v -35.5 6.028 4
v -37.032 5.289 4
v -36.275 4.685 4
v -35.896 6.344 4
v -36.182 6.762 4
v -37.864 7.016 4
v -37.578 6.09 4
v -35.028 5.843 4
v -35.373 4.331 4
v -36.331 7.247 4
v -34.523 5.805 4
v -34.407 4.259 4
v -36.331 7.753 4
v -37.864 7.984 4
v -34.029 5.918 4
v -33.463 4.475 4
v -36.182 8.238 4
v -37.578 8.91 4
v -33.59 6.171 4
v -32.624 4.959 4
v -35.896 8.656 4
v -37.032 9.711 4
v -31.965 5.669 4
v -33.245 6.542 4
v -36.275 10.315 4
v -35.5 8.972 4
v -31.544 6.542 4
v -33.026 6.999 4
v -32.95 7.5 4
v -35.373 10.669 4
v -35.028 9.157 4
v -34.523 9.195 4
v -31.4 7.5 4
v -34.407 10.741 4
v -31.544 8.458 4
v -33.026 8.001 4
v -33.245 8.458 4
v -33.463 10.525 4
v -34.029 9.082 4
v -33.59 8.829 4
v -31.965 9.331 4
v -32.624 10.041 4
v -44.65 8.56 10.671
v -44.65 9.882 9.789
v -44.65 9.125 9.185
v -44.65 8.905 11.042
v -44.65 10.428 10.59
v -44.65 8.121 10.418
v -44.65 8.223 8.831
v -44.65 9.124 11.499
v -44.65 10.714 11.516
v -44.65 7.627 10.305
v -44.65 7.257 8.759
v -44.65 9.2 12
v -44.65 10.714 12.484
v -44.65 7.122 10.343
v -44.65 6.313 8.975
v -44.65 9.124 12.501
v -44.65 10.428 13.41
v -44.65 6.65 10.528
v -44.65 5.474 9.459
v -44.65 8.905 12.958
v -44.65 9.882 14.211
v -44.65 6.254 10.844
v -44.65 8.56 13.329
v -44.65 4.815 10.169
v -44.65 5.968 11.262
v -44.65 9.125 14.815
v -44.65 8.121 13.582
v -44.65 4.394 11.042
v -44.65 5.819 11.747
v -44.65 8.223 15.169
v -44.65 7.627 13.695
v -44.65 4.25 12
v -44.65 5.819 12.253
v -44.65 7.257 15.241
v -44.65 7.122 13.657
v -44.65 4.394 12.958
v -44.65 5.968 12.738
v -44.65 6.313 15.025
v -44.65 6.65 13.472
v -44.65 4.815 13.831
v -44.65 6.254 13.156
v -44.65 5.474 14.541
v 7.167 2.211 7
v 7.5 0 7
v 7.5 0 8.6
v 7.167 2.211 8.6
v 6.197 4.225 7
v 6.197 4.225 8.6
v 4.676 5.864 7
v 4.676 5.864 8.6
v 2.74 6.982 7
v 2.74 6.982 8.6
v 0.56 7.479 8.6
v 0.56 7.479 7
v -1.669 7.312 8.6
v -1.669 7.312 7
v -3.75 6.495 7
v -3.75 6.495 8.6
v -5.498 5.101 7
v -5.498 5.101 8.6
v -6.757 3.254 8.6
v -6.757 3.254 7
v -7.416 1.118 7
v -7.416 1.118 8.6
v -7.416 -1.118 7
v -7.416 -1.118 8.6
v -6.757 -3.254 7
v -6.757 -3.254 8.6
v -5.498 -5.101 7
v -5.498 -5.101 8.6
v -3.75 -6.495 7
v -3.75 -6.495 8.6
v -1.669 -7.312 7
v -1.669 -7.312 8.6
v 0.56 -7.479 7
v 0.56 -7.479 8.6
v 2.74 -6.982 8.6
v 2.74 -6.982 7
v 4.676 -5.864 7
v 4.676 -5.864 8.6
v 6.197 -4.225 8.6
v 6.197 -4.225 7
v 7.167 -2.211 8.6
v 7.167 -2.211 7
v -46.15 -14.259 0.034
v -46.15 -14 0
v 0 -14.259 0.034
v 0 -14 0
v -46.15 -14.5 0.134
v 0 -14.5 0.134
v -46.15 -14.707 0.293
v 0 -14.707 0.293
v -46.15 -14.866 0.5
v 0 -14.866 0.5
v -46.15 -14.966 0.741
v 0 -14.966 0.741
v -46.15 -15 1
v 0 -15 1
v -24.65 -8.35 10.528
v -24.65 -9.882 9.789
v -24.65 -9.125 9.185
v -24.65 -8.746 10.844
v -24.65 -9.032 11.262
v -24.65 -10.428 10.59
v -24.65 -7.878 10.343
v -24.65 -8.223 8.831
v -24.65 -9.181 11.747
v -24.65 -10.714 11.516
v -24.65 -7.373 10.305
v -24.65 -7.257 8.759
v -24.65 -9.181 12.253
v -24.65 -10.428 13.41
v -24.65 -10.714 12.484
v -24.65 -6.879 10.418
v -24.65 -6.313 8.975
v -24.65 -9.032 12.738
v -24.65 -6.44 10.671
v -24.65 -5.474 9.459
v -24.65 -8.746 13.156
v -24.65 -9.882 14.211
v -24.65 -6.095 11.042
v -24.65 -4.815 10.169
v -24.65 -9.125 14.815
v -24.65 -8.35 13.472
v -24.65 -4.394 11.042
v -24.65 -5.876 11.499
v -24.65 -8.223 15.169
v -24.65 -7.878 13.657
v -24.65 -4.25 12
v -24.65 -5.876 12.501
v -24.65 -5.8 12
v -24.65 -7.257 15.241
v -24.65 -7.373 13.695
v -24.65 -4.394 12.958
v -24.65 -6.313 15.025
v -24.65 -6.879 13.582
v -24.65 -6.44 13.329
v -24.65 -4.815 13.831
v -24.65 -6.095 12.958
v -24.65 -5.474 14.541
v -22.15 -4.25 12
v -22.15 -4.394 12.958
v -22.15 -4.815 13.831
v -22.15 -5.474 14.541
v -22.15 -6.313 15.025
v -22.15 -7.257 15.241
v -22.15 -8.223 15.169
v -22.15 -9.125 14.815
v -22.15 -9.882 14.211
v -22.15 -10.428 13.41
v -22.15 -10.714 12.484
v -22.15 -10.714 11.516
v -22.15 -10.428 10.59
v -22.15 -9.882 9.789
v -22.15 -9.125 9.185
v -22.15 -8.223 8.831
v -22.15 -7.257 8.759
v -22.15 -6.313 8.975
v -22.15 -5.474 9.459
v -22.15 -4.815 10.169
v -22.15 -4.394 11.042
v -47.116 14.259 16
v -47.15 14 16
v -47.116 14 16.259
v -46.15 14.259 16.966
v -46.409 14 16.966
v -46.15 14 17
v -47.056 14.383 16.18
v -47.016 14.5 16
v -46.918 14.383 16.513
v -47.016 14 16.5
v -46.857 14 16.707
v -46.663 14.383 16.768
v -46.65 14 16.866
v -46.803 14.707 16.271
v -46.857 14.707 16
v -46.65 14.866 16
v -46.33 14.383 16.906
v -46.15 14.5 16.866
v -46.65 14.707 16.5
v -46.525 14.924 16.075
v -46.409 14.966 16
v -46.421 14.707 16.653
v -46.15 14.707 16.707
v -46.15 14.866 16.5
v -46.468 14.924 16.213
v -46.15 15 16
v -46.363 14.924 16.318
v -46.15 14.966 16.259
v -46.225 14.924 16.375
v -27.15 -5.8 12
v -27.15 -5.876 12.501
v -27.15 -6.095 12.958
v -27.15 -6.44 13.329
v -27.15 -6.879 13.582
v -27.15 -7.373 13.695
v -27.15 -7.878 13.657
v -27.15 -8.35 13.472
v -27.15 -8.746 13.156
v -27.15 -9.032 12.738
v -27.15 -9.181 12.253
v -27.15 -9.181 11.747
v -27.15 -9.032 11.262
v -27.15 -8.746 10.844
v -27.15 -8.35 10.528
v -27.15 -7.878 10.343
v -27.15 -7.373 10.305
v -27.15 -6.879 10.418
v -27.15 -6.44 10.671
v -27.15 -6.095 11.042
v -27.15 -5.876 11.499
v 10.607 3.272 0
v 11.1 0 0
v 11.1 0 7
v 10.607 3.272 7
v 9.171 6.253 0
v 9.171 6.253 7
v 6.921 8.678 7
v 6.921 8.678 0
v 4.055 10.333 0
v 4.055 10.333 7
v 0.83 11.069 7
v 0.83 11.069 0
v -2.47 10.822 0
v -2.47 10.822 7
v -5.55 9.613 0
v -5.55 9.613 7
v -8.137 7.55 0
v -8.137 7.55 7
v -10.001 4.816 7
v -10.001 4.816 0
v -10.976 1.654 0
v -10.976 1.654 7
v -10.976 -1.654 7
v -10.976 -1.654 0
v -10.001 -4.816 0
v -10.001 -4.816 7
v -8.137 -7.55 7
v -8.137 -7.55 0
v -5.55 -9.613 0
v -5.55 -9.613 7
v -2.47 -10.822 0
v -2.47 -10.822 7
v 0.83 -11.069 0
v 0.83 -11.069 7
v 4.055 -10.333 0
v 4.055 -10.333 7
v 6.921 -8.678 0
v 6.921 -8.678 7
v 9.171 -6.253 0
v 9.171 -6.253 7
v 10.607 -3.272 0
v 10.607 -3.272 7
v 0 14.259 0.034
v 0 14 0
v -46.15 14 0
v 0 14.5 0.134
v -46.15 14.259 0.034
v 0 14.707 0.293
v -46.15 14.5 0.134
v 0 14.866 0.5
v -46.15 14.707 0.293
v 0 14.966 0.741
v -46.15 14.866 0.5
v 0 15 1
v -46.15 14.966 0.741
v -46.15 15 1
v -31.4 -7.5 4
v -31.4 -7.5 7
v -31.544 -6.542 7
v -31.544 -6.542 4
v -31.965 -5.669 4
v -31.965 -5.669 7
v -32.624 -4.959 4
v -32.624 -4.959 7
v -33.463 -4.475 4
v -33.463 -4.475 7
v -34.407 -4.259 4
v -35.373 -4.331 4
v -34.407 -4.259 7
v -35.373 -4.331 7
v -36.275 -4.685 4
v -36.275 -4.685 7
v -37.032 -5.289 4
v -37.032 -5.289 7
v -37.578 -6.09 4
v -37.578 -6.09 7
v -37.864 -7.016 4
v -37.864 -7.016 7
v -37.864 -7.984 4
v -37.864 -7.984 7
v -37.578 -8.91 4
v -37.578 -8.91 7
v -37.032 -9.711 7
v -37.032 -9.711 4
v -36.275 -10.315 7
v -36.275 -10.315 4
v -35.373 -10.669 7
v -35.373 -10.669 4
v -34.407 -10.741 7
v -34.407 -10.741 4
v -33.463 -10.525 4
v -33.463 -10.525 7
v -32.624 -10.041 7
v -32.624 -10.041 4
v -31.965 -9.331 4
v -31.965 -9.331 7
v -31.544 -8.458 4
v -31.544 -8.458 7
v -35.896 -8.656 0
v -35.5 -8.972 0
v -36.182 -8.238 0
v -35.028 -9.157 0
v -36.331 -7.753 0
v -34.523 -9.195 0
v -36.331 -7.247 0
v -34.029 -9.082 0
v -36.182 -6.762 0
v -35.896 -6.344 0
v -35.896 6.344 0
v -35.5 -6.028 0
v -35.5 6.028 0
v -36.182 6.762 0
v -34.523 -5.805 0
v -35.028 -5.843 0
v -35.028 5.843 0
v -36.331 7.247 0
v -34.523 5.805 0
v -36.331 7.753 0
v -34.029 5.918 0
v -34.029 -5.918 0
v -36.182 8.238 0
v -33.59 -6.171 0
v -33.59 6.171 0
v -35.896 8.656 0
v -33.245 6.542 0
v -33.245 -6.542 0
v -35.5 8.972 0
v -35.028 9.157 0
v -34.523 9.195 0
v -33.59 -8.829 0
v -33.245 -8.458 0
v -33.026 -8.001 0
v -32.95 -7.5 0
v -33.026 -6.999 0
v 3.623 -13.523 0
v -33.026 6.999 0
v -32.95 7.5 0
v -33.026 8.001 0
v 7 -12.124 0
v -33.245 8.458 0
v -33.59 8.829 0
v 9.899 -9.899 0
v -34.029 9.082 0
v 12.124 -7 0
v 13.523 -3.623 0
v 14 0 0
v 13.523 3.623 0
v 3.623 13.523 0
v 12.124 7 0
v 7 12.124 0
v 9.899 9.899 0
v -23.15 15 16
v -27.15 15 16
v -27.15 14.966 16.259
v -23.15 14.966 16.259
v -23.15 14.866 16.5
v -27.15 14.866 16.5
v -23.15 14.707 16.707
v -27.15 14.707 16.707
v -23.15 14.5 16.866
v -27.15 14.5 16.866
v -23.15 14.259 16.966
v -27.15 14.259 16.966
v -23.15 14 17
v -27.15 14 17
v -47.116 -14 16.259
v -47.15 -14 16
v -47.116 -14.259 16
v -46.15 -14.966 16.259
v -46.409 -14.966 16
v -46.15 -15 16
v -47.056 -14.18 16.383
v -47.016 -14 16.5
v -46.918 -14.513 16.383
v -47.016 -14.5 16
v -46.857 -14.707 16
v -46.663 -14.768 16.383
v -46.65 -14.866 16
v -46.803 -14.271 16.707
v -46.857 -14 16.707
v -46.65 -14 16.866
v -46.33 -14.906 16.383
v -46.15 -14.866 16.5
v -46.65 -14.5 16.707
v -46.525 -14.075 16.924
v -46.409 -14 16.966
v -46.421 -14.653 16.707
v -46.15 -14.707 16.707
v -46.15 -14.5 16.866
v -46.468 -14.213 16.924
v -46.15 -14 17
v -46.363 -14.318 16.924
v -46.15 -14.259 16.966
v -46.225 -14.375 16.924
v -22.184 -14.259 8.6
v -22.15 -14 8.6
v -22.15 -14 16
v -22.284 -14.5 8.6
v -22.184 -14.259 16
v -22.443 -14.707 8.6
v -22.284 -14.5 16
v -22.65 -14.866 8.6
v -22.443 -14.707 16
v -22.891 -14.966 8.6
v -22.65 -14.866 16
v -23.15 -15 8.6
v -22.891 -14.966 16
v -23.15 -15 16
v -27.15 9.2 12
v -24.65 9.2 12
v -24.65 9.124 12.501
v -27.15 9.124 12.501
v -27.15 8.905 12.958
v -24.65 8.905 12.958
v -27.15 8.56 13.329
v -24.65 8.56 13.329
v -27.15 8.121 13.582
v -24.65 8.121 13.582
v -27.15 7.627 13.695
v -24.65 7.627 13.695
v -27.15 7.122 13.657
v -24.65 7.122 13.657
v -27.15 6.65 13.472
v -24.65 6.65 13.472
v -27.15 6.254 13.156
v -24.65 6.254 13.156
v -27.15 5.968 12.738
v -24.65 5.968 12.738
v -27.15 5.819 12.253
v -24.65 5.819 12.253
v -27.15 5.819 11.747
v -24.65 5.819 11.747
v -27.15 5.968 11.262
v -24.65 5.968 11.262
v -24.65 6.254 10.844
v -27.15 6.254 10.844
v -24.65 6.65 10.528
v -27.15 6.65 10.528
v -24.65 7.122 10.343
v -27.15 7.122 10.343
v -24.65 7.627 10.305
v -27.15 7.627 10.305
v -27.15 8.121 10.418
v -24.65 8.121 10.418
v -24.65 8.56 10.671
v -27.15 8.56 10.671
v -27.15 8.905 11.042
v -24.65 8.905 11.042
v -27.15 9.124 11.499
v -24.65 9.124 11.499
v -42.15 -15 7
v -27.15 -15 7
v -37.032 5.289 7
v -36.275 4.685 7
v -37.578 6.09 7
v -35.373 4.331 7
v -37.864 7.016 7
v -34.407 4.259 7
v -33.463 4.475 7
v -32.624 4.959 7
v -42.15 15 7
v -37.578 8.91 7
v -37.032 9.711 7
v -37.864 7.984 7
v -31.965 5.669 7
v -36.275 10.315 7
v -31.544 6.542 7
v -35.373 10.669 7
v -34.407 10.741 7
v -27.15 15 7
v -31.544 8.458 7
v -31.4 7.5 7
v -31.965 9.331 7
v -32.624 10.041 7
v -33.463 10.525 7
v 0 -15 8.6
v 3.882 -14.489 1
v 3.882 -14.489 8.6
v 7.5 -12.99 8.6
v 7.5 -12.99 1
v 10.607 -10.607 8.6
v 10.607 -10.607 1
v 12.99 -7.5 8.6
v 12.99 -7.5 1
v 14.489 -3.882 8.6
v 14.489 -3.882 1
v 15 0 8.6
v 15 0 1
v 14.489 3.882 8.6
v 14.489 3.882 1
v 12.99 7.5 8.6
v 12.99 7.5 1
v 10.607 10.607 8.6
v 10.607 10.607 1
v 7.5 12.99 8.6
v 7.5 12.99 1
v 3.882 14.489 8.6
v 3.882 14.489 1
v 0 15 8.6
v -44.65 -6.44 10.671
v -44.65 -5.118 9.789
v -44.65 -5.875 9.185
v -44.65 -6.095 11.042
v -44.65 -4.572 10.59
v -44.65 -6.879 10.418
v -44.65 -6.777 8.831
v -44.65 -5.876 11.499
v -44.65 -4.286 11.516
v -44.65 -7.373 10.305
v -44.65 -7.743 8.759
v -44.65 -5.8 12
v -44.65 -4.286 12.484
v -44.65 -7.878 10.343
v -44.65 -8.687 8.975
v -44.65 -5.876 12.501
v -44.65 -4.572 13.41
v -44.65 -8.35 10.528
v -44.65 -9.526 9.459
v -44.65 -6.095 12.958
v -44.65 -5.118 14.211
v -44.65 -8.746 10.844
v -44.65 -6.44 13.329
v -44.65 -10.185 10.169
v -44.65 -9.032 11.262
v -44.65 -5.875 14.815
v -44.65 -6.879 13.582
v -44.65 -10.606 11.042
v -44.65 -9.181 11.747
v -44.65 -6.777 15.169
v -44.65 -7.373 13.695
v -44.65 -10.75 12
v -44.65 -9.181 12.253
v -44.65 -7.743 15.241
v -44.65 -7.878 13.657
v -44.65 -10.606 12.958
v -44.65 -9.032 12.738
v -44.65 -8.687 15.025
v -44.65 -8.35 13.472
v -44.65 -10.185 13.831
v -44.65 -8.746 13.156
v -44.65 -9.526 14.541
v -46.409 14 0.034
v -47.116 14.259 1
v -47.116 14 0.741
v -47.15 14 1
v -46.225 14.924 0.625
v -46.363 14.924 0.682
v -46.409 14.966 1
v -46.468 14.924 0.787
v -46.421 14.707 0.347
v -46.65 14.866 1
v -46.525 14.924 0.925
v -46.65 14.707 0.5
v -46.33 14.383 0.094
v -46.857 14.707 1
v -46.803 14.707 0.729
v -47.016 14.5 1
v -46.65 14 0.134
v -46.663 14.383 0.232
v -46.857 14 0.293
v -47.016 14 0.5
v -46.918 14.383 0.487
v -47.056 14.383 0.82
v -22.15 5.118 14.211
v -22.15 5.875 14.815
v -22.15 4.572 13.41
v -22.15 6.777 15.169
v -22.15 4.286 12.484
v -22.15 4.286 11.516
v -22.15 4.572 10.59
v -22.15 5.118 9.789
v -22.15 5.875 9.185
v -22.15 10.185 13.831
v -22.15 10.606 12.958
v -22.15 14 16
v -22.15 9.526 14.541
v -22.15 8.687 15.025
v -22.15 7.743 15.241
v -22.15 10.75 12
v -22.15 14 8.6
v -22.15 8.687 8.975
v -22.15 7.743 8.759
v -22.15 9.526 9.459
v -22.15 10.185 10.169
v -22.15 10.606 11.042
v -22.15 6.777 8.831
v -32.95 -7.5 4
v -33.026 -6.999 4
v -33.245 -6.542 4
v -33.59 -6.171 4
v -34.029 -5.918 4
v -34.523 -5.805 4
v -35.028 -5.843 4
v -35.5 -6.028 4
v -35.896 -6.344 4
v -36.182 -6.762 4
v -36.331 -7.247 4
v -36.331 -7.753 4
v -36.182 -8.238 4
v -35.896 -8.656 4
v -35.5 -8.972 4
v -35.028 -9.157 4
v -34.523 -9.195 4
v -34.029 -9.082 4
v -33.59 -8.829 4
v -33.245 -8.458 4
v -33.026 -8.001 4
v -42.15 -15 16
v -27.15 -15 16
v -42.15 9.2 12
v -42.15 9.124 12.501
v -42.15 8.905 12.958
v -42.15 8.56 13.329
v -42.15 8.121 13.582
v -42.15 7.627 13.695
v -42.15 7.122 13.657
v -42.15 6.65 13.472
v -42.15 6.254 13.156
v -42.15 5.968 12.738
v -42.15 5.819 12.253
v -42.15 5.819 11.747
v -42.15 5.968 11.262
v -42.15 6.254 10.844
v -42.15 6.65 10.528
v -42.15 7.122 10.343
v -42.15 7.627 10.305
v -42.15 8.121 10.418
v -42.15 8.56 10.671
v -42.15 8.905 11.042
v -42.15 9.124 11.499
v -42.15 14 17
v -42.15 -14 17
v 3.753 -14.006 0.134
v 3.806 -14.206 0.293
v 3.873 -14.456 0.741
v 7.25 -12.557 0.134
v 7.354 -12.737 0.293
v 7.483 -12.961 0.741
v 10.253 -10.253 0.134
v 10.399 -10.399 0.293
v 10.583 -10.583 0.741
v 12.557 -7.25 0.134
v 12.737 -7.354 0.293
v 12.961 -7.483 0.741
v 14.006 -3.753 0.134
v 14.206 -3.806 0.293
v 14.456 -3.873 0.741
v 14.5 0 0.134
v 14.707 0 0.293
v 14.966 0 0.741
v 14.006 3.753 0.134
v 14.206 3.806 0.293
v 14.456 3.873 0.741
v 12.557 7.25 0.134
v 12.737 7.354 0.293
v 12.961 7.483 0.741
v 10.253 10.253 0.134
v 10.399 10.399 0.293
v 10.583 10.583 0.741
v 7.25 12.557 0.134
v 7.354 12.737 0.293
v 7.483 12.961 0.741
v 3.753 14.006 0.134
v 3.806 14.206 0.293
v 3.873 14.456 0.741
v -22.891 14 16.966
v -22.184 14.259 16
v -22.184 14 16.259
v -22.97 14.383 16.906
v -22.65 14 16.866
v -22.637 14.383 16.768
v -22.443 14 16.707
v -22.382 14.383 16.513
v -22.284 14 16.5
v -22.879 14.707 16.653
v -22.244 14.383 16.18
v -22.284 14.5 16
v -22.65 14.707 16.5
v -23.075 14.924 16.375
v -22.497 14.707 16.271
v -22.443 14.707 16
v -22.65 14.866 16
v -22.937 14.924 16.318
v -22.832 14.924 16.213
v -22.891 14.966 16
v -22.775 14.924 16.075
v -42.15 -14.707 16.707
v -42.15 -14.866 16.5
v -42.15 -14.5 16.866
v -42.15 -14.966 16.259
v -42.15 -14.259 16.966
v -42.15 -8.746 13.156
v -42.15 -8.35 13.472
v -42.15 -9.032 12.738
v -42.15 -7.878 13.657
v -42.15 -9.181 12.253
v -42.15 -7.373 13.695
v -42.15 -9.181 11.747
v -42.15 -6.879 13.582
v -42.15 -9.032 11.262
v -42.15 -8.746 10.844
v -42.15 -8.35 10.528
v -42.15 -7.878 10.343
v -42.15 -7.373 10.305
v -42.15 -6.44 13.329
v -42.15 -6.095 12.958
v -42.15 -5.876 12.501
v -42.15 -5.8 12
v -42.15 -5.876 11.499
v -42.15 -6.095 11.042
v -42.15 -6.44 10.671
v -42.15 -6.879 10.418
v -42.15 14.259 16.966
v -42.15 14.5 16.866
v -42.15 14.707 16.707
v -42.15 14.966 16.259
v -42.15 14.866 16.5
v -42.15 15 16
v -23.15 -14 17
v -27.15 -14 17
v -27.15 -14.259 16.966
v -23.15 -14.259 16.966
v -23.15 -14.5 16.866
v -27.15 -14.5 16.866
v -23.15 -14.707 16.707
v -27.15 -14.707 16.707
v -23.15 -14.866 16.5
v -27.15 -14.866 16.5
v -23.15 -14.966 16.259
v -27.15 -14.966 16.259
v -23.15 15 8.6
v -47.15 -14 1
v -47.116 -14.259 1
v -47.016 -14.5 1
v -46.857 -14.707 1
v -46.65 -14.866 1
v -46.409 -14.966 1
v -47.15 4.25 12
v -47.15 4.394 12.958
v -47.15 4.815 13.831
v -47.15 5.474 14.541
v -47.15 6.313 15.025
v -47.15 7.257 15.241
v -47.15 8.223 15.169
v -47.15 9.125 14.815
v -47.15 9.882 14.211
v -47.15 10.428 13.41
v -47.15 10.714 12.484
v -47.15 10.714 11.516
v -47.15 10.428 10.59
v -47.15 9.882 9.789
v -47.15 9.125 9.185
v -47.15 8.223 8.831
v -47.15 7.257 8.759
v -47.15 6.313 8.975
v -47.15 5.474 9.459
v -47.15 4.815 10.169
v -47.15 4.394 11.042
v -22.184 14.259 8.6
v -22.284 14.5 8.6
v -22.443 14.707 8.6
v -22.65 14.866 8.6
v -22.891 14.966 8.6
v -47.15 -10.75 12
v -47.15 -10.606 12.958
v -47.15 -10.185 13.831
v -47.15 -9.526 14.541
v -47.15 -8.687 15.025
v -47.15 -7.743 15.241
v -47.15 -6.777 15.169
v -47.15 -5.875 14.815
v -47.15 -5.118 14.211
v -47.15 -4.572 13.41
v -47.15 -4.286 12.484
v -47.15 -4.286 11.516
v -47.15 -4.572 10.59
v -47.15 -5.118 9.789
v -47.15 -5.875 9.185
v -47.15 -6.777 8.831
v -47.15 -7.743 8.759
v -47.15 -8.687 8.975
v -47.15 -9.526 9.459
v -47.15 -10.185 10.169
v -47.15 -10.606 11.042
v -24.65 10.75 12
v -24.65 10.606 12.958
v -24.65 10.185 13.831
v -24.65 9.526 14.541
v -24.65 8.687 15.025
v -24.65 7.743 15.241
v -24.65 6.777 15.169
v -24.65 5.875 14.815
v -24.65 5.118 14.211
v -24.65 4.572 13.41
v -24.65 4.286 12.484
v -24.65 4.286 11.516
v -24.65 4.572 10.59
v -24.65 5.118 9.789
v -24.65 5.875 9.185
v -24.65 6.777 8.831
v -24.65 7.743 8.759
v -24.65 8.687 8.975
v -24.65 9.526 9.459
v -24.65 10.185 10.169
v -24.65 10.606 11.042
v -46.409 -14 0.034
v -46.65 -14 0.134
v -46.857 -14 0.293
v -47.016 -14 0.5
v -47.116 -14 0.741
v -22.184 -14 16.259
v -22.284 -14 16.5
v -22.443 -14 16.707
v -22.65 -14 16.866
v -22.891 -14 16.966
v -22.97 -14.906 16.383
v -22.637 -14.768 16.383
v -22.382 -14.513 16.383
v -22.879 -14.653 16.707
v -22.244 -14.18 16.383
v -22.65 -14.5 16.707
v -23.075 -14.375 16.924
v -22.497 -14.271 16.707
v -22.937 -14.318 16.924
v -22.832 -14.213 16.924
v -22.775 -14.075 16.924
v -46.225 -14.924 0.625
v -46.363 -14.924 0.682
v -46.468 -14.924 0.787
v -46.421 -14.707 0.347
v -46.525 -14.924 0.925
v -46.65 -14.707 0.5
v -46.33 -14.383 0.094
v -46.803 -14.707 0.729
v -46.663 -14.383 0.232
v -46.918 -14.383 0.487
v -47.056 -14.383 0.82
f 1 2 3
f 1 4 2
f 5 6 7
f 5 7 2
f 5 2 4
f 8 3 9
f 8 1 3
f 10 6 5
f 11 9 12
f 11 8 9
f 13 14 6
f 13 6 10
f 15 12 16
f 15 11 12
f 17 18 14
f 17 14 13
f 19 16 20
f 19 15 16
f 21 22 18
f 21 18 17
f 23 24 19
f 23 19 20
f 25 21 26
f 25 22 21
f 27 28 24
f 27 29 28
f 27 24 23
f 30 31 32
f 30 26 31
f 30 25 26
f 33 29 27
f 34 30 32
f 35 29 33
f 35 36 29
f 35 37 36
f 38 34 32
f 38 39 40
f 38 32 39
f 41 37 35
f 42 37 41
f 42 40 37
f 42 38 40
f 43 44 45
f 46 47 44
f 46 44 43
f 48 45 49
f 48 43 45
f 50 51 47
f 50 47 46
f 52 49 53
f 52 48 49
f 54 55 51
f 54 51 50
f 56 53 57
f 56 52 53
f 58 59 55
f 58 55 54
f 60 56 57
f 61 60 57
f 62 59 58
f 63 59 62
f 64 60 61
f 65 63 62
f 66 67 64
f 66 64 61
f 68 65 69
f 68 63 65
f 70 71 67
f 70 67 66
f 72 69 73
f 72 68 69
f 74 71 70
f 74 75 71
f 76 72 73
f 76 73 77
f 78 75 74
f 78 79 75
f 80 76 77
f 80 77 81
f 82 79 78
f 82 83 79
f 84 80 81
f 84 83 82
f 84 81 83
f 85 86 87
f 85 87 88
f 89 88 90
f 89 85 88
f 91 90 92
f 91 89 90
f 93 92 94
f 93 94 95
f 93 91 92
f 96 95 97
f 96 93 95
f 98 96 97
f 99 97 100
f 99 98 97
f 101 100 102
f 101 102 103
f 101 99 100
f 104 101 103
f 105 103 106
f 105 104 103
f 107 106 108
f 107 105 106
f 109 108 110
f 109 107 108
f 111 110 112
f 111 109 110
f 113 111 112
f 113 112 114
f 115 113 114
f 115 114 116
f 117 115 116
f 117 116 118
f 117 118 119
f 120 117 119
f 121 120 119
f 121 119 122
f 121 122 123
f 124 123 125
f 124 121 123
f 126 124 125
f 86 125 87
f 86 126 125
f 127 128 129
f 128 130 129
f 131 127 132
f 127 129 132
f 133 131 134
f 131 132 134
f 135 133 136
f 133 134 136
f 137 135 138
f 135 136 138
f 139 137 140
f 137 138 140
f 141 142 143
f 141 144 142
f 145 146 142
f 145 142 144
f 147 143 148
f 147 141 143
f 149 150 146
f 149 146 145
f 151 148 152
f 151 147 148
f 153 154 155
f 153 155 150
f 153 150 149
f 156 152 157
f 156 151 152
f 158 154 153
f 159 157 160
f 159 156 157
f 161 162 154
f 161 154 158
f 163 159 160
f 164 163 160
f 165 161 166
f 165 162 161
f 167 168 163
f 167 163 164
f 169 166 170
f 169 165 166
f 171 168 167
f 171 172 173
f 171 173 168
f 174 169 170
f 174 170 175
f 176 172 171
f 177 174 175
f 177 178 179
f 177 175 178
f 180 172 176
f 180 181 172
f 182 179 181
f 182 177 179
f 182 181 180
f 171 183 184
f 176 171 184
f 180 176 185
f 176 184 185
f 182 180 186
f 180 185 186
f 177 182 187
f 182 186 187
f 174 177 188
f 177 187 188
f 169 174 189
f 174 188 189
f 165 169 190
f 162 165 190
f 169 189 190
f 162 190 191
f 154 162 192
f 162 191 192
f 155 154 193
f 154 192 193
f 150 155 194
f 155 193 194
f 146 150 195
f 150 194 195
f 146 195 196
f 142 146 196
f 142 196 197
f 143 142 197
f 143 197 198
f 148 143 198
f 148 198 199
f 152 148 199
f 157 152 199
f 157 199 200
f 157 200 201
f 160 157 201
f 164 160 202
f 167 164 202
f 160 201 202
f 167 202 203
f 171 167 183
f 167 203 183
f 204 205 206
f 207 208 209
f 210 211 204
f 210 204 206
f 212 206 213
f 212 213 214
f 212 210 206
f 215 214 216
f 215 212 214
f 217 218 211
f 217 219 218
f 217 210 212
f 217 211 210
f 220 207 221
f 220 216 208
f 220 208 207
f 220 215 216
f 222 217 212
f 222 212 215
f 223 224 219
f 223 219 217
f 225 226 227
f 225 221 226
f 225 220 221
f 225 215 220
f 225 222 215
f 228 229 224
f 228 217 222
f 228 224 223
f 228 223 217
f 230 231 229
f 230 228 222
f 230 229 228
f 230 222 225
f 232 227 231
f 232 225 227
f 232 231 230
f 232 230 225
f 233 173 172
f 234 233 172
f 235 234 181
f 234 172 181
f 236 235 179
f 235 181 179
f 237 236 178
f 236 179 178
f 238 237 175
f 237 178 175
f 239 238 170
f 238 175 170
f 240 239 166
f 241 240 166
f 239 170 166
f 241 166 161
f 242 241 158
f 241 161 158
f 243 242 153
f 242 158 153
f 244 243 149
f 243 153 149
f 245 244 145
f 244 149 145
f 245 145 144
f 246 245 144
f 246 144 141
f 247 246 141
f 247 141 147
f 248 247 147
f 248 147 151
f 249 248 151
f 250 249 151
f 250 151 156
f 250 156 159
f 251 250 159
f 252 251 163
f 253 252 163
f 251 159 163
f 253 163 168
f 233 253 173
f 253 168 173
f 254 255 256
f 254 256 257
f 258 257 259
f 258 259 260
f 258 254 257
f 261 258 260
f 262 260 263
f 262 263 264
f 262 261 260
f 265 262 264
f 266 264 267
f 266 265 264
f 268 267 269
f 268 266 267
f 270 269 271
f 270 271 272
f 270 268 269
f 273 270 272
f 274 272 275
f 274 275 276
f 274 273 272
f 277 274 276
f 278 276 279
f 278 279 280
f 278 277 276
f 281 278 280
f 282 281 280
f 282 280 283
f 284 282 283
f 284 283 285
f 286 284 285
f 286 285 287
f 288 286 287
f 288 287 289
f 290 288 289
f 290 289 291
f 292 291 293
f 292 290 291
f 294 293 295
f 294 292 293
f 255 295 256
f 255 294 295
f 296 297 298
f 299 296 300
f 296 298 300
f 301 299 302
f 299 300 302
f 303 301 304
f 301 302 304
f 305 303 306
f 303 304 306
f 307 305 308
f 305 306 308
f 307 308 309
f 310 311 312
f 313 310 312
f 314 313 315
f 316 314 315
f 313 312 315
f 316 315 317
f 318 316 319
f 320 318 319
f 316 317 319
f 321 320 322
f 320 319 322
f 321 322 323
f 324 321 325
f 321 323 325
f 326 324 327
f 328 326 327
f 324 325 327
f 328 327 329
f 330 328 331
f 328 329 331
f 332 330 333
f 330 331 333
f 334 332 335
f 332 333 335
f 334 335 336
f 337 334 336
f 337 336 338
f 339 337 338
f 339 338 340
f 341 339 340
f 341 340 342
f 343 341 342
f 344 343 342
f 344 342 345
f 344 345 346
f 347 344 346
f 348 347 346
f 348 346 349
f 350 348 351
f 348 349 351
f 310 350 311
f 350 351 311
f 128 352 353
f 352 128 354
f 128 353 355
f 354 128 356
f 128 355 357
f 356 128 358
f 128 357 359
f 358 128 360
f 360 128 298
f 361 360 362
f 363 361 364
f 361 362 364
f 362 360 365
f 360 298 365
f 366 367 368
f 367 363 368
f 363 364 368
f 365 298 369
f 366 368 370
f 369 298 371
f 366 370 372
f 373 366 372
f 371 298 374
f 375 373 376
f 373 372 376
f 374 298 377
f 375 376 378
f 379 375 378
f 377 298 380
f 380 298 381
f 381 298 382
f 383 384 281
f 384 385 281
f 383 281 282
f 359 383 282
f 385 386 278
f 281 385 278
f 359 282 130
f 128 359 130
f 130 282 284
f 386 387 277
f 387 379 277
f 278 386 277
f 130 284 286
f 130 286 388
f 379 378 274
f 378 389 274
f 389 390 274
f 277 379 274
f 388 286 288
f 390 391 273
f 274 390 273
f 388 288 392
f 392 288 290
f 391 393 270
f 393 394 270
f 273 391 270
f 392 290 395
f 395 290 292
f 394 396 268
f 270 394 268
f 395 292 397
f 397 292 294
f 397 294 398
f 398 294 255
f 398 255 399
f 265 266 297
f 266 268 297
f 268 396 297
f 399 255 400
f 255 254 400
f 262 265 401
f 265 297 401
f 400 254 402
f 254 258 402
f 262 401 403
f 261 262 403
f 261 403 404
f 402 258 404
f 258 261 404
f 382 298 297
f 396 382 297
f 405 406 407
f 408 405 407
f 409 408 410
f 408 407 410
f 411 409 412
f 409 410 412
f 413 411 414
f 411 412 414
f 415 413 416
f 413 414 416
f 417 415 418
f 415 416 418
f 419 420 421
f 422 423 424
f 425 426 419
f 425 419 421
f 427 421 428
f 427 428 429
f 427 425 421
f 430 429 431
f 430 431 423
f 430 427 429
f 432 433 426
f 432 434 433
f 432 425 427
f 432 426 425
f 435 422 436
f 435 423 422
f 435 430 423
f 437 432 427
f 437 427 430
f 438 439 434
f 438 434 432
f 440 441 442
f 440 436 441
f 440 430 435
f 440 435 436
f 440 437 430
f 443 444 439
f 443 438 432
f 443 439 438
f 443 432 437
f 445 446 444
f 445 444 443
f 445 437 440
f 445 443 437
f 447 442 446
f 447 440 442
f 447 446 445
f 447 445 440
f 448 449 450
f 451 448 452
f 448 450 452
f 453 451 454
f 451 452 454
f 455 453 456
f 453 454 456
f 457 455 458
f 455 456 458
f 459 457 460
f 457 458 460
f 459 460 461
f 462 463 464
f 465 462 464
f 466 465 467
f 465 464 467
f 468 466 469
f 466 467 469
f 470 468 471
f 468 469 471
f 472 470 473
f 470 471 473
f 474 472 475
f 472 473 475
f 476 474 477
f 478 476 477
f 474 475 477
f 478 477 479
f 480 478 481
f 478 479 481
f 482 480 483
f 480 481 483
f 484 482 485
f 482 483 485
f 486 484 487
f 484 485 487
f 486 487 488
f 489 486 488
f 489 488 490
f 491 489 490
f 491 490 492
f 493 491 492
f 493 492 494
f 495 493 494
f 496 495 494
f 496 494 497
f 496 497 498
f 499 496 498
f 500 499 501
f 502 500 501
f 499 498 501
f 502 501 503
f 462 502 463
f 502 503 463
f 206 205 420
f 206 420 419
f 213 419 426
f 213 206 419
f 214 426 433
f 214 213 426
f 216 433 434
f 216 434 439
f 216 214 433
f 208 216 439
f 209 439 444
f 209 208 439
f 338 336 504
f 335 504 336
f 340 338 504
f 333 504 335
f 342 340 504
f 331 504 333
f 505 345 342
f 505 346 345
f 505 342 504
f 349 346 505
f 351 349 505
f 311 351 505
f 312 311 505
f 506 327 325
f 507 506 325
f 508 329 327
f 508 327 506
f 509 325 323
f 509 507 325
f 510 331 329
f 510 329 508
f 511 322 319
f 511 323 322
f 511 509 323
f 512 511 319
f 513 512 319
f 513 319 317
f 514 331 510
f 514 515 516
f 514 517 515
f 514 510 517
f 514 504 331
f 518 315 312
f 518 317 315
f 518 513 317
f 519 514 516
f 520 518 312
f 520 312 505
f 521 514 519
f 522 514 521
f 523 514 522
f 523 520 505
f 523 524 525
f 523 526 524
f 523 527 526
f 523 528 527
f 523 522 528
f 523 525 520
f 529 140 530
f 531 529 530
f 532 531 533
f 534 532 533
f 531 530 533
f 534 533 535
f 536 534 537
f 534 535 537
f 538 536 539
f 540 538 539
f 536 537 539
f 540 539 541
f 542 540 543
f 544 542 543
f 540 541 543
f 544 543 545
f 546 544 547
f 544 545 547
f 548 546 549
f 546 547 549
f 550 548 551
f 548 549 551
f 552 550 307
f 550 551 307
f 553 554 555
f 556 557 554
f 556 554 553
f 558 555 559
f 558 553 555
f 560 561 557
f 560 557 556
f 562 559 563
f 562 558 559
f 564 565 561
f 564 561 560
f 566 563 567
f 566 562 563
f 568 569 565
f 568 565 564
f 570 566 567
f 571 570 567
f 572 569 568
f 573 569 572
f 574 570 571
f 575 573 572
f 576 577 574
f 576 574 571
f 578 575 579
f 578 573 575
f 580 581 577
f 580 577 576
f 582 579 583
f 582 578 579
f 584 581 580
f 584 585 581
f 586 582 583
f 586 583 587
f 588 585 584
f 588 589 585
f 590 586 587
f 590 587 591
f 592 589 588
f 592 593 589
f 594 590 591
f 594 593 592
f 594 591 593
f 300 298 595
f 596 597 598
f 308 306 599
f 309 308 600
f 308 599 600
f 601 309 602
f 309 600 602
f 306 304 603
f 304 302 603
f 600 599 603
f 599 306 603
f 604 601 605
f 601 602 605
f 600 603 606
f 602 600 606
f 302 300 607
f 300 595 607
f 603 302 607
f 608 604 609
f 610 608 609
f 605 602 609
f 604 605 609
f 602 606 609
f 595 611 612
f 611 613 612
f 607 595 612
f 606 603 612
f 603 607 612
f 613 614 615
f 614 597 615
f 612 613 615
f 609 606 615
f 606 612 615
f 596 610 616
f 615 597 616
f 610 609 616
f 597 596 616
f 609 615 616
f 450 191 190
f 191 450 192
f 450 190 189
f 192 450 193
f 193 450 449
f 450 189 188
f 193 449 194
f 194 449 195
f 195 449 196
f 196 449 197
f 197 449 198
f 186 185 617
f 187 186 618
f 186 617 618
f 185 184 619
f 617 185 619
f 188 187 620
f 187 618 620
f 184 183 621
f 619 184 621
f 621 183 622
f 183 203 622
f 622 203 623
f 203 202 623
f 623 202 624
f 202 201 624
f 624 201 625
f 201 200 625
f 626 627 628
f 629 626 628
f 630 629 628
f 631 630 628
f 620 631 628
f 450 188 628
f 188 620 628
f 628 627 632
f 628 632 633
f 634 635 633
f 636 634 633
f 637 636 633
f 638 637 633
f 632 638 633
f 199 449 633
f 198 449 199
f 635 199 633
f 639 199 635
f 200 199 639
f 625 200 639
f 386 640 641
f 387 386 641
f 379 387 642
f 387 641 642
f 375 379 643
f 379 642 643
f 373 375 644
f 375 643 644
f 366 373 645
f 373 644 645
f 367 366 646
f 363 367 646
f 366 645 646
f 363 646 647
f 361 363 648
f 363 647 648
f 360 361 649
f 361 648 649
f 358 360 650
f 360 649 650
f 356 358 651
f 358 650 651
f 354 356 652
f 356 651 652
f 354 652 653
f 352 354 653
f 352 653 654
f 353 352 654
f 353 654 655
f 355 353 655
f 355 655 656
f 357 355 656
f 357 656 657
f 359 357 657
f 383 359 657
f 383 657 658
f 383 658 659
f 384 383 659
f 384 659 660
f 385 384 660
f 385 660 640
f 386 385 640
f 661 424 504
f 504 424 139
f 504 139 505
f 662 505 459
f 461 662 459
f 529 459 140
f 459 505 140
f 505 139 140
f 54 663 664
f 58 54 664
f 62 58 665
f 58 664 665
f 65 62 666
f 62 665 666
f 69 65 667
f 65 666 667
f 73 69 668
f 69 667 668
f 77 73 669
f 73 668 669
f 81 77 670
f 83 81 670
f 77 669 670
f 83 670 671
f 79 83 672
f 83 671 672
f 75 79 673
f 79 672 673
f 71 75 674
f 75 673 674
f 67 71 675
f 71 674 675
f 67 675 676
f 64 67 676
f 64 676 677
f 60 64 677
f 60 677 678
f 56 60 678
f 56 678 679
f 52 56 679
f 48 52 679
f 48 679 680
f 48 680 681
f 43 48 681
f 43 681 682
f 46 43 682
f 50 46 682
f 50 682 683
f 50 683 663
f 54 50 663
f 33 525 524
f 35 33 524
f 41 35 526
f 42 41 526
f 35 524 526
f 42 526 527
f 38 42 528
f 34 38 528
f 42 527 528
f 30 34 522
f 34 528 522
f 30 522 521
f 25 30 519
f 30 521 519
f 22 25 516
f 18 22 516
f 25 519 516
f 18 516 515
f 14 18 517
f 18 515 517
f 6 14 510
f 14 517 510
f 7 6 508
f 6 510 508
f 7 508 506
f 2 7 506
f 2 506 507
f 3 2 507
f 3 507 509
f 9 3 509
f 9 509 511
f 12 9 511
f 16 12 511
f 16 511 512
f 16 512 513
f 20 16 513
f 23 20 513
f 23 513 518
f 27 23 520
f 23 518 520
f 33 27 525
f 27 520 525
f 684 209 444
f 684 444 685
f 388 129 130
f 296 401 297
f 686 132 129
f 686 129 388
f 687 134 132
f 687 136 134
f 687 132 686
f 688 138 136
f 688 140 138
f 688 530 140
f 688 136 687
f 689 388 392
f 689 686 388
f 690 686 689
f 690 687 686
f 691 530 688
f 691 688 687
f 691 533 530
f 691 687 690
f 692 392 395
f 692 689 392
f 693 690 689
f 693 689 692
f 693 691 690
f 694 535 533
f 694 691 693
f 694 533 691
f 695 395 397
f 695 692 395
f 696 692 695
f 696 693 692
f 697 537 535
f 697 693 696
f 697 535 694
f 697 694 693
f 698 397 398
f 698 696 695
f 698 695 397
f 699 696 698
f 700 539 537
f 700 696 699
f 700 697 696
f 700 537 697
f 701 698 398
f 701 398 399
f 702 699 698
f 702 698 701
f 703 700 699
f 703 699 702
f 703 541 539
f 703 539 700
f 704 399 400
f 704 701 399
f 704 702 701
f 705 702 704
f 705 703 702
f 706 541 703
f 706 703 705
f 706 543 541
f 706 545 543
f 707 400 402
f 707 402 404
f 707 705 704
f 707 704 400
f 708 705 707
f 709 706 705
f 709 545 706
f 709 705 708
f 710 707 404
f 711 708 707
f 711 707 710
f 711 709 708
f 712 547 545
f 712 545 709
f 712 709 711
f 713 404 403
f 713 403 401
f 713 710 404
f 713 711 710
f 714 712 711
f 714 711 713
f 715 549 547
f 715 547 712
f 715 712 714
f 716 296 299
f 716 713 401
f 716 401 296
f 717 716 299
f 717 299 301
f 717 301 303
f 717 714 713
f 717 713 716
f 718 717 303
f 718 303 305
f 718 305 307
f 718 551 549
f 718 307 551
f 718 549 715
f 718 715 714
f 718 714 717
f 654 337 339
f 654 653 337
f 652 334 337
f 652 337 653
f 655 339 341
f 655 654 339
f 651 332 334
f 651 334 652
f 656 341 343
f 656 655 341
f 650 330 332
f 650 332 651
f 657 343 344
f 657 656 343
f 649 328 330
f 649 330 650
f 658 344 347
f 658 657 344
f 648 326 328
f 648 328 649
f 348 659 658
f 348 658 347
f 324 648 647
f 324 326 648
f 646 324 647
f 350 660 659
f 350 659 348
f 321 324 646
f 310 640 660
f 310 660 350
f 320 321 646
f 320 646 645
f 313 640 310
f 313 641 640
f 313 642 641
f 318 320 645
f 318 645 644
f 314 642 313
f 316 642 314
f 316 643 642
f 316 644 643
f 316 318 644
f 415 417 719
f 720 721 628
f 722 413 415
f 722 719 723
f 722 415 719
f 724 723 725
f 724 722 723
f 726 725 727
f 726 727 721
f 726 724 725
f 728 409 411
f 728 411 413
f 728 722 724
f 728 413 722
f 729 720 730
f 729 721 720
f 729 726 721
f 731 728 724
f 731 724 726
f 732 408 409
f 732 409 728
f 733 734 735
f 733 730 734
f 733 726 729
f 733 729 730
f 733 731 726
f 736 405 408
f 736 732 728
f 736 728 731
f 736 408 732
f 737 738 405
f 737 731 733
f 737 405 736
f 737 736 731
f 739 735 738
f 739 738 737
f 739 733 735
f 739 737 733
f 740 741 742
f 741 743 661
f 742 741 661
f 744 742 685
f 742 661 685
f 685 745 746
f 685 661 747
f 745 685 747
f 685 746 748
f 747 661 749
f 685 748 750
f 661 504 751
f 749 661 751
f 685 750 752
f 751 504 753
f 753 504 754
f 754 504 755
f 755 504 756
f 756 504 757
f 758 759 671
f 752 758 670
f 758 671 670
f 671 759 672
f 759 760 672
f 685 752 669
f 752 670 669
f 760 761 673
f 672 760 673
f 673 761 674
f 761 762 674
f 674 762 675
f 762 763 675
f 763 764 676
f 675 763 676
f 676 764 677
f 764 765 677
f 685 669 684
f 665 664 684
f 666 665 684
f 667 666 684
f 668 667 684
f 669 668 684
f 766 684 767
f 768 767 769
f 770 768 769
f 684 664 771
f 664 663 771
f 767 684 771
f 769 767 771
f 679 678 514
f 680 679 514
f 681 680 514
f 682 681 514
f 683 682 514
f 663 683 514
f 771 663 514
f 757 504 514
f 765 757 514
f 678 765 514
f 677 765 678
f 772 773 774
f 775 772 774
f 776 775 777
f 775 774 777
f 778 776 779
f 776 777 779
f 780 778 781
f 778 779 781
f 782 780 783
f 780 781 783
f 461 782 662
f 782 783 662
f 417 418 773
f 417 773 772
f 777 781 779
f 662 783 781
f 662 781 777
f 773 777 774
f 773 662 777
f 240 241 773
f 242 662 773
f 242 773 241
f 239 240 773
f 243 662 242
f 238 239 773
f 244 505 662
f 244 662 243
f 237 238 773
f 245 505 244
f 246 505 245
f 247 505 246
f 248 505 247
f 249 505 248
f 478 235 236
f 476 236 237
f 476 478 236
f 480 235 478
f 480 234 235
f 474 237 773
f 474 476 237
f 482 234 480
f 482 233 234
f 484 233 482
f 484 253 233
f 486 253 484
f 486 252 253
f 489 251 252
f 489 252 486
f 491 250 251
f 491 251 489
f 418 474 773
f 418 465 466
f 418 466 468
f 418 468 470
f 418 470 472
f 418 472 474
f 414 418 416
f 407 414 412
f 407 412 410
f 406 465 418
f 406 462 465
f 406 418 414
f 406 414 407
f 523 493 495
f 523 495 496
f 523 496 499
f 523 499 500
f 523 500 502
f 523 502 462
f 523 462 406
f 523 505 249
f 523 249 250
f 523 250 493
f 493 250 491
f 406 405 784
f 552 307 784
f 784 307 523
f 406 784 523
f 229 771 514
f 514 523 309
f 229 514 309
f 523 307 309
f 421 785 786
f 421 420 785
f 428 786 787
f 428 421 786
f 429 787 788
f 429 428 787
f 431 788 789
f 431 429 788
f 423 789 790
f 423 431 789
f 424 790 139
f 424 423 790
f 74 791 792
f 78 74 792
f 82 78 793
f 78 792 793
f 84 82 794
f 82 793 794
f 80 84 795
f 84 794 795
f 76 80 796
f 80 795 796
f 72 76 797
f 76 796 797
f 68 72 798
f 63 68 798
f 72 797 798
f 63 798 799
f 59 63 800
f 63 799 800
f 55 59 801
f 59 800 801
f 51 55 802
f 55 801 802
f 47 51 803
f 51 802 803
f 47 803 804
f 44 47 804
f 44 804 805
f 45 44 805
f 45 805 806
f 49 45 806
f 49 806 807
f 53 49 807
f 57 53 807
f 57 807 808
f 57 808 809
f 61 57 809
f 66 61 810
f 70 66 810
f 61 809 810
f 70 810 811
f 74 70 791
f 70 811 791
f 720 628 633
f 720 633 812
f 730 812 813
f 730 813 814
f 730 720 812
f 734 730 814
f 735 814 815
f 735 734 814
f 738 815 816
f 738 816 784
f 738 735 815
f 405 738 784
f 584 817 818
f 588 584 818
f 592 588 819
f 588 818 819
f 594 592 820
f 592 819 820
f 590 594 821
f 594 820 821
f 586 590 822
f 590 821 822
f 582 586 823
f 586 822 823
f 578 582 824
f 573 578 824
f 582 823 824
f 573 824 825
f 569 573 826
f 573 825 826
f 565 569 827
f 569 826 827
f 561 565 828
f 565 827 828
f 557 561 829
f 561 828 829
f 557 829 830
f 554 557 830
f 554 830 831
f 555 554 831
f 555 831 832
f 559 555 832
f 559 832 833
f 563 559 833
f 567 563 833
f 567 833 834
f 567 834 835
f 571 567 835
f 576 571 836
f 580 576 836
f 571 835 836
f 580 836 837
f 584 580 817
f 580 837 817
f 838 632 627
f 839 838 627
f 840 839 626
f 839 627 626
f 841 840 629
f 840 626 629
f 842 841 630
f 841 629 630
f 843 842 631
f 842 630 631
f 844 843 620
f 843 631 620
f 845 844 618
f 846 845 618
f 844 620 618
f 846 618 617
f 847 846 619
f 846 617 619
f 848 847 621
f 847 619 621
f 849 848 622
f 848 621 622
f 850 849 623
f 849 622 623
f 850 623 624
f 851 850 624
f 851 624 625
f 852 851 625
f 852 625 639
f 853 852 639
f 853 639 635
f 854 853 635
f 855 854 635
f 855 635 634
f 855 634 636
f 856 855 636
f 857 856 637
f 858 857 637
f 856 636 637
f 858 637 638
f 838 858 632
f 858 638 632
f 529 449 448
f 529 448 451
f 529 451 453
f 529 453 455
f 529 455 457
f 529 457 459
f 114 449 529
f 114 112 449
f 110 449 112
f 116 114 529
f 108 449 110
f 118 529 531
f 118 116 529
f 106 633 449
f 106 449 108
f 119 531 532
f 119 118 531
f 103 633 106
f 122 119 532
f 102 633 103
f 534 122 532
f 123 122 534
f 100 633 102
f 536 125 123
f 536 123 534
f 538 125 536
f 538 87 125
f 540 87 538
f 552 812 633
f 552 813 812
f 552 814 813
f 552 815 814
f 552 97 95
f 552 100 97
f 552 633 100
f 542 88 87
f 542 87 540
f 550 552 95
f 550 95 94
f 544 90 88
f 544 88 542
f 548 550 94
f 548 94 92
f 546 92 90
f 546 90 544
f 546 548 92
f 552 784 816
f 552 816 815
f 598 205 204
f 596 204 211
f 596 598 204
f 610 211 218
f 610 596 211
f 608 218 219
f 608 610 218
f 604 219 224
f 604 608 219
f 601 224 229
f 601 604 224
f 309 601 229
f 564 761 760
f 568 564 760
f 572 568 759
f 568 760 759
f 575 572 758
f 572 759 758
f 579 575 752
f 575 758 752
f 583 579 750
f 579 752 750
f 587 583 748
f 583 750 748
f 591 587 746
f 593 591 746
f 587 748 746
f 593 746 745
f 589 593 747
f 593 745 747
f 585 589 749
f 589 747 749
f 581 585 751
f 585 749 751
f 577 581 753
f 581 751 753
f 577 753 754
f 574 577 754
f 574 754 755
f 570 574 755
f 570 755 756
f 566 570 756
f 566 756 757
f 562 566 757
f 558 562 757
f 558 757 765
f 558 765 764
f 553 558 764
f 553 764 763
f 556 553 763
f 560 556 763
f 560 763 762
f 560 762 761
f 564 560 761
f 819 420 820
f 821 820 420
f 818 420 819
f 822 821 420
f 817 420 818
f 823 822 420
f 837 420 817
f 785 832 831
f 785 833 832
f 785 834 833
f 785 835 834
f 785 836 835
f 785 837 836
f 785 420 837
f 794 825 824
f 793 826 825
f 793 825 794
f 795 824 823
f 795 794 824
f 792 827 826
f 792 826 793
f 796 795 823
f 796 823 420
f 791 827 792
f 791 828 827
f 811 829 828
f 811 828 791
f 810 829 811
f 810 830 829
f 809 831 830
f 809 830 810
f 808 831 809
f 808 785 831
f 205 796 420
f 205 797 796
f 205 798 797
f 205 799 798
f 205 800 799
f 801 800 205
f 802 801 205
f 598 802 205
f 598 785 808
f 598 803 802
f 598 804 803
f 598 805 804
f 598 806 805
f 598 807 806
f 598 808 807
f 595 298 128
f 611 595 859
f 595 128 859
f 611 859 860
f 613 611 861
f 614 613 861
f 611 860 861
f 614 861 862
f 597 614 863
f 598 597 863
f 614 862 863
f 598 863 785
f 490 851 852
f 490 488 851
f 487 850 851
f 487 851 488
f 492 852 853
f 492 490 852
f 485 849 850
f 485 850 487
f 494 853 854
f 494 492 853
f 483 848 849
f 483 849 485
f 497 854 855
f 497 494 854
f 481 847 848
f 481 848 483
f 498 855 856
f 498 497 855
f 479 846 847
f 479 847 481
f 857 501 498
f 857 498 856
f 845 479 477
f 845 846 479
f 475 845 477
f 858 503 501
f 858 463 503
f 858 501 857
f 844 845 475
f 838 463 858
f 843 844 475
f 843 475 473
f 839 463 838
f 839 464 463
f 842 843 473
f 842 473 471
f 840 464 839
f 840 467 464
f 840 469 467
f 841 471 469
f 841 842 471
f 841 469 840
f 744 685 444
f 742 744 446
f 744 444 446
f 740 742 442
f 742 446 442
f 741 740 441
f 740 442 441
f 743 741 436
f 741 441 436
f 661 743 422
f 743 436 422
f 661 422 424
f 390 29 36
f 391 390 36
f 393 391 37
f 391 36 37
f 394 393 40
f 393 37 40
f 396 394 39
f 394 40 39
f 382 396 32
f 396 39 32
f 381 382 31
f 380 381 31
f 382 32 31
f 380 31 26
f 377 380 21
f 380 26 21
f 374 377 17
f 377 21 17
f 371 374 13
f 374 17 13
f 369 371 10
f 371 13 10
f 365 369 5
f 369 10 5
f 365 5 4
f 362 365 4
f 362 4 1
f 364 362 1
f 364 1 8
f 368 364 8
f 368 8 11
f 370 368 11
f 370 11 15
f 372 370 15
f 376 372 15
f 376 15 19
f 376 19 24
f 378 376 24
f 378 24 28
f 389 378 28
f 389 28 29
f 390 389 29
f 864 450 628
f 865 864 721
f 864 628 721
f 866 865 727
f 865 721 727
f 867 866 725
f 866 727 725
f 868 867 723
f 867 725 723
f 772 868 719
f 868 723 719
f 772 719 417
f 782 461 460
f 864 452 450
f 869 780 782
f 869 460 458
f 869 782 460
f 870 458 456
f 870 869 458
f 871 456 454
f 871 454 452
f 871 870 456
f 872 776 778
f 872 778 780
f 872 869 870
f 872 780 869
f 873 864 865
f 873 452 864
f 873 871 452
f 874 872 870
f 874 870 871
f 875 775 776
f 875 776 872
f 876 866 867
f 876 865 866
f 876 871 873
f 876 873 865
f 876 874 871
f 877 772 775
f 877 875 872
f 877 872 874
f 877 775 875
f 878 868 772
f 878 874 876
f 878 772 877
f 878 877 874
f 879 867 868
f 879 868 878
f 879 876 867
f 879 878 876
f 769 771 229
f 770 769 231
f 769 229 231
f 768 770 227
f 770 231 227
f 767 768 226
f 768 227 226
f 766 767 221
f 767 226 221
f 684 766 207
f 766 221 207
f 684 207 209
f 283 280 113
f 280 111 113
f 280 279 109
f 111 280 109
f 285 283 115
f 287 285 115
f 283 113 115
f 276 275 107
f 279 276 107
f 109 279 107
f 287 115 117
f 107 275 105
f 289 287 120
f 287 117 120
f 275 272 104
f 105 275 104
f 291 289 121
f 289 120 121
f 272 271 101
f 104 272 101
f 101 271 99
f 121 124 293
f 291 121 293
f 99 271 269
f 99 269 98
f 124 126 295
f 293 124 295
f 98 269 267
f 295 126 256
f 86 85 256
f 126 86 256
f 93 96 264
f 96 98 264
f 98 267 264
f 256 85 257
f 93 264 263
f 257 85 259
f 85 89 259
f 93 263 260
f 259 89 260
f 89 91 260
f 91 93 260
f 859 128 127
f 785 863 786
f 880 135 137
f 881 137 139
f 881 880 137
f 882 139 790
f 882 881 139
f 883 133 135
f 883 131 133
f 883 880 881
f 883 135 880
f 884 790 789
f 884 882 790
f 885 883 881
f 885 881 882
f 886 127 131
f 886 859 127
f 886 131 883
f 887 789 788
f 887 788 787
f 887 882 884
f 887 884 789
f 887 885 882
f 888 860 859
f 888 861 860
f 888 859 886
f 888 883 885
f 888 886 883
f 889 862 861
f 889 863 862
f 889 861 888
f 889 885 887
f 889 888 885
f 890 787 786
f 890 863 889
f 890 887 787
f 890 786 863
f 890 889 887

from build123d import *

# Parameters (mm, degrees)
F0_R          = 11.1
F1_DEPTH      = 7
F2_W          = 5
F2_H          = 30
F3_DEPTH      = 10
F4_R          = 1.7
F5_DEPTH      = 5.001
F6_R          = 3.25
F7_DEPTH      = 2.5
F8_R          = 1.7
F9_DEPTH      = 25.001
F10_R         = 3.25
F11_DEPTH     = 2.5
F12_R         = 7.5
F13_DEPTH     = 1.6
F14_R         = 1
F15_R         = 1.7
F16_DEPTH     = 7.001
F17_R         = 3.25
F18_DEPTH     = 3
F19_T1_DEPTH  = 6.5
F19_T3_DEPTH  = 6.5
F19_S7_W      = 1
F19_S7_H      = 1
F19_T8_DEPTH  = 1
F19_S13_W     = 1
F19_S13_H     = 1
F19_T14_DEPTH = 1
F19_S19_W     = 1
F19_S19_H     = 1
F19_T20_DEPTH = 1
F19_S25_W     = 1
F19_S25_H     = 1
F19_T26_DEPTH = 1


# Not quite as in the source:
# - a fillet or chamfer that OpenCascade refuses, or shapes differently, is made with other operations: its cross-section is extruded or revolved along the edge and cut away or added


with BuildPart() as f1:
    # F0 (on Top) → F1 (new body)
    with BuildSketch(Plane.XY):
        with BuildLine():
            Line((-47.15, -15), (0, -15))
            ThreePointArc((0, -15), (15, 0), (0, 15))
            Line((0, 15), (-47.15, 15))
            Line((-47.15, 15), (-47.15, -15))
        make_face()
        Circle(F0_R, mode=Mode.SUBTRACT)
    extrude(amount=F1_DEPTH)

    # F2 (on face) → F3 (join)
    with BuildSketch(Plane.XY.offset(7)):
        with Locations((-44.65, 0)):
            Rectangle(F2_W, F2_H)
        with Locations((-24.65, 0)):
            Rectangle(F2_W, F2_H)
    extrude(amount=F3_DEPTH)

    # F4 (on face) → F5 (cut, through all)
    with BuildSketch(Plane.YZ.offset(-42.15)):
        with Locations((7.5, 12)):
            Circle(F4_R)
        with Locations((-7.5, 12)):
            Circle(F4_R)
    extrude(amount=-F5_DEPTH, mode=Mode.SUBTRACT)

    # F6 (on face) → F7 (cut)
    with BuildSketch(Plane(origin=(-47.15, 0, 0), x_dir=(0, -1, 0), z_dir=(-1, 0, 0))):
        with Locations((-7.5, 12)):
            Circle(F6_R)
        with Locations((7.5, 12)):
            Circle(F6_R)
    extrude(amount=-F7_DEPTH, mode=Mode.SUBTRACT)

    # F8 (on face) → F9 (cut, through all)
    with BuildSketch(Plane.YZ.offset(-22.15)):
        with Locations((7.5, 12)):
            Circle(F8_R)
        with Locations((-7.5, 12)):
            Circle(F8_R)
    extrude(amount=-F9_DEPTH, mode=Mode.SUBTRACT)

    # F10 (on face) → F11 (cut)
    with BuildSketch(Plane.YZ.offset(-22.15)):
        with Locations((7.5, 12)):
            Circle(F10_R)
        with Locations((-7.5, 12)):
            Circle(F10_R)
    extrude(amount=-F11_DEPTH, mode=Mode.SUBTRACT)

    # F12 (on face) → F13 (join)
    with BuildSketch(Plane.XY.offset(7)):
        with BuildLine():
            ThreePointArc((0, -15), (15, 0), (0, 15))
            Line((0, 15), (-22.15, 15))
            Line((-22.15, 15), (-22.15, -15))
            Line((-22.15, -15), (0, -15))
        make_face()
        Circle(F12_R, mode=Mode.SUBTRACT)
    extrude(amount=F13_DEPTH)

    # F14
    f14_edges = [f1.edges().sort_by_distance(p)[0] for p in [
        (-47.15, 0, 0),
        (-23.575, -15, 0),
        (15, 0, 0),
        (-23.575, 15, 0),
        (-47.15, -15, 8.5),
        (-47.15, 15, 8.5),
        (-47.15, 0, 17),
        (-22.15, 0, 17),
        (-22.15, -15, 12.8),
        (-22.15, 15, 12.8),
    ]]
    fillet(f14_edges, radius=F14_R)

    # F15 (on face) → F16 (cut, through all)
    with BuildSketch(Plane.XY.offset(7)):
        with Locations((-34.65, -7.5)):
            Circle(F15_R)
        with Locations((-34.65, 7.5)):
            Circle(F15_R)
    extrude(amount=-F16_DEPTH, mode=Mode.SUBTRACT)

    # F17 (on face) → F18 (cut)
    with BuildSketch(Plane.XY.offset(7)):
        with Locations((-34.65, -7.5)):
            Circle(F17_R)
        with Locations((-34.65, 7.5)):
            Circle(F17_R)
    extrude(amount=-F18_DEPTH, mode=Mode.SUBTRACT)

    # F19: fillet of radius 1 on 4 edges, made by hand

    # F19_s2 → F19_t1 (cut)
    with BuildSketch(Plane.YZ.offset(-46.15)):
        with BuildLine():
            ThreePointArc((15, 16), (14.7071067812, 16.7071067812), (14, 17))
            Line((14, 17), (15, 17))
            Line((15, 17), (15, 16))
        make_face()
        with BuildLine():
            ThreePointArc((-14, 17), (-14.7071067812, 16.7071067812), (-15, 16))
            Line((-15, 16), (-15, 17))
            Line((-15, 17), (-14, 17))
        make_face()
    extrude(amount=F19_T1_DEPTH, mode=Mode.SUBTRACT)

    # F19_s4 → F19_t3 (cut)
    with BuildSketch(Plane.YZ.offset(-29.65)):
        with BuildLine():
            ThreePointArc((15, 16), (14.7071067812, 16.7071067812), (14, 17))
            Line((14, 17), (15, 17))
            Line((15, 17), (15, 16))
        make_face()
        with BuildLine():
            ThreePointArc((-14, 17), (-14.7071067812, 16.7071067812), (-15, 16))
            Line((-15, 16), (-15, 17))
            Line((-15, 17), (-14, 17))
        make_face()
    extrude(amount=F19_T3_DEPTH, mode=Mode.SUBTRACT)


with BuildPart() as f19_tool6:
    # F19_s7 → F19_t8 (new body)
    with BuildSketch(Plane.XY.offset(16)):
        with Locations((-46.65, -14.5)):
            Rectangle(F19_S7_W, F19_S7_H)
    extrude(amount=F19_T8_DEPTH)

    # F19_s9 → F19_t10 (revolve, cut)
    with BuildSketch(Plane(origin=(-46.15, -14, 16), x_dir=(0.7071067812, 0.7071067812, 0), z_dir=(0.7071067812, -0.7071067812, 0))):
        with BuildLine():
            ThreePointArc((0, -1), (1, 0), (0, 1))
            Line((0, 1), (0, -1))
        make_face()
    revolve(axis=Axis((-46.15, -14, 16), (0, 0, 1)), mode=Mode.SUBTRACT)


with BuildPart() as f1_1:
    add(f1.part)

    # F19_t5: cut F19_tool6
    add(f19_tool6.part, mode=Mode.SUBTRACT)


with BuildPart() as f19_tool12:
    # F19_s13 → F19_t14 (new body)
    with BuildSketch(Plane.XY.offset(16)):
        with Locations((-22.65, -14.5)):
            Rectangle(F19_S13_W, F19_S13_H)
    extrude(amount=F19_T14_DEPTH)

    # F19_s15 → F19_t16 (revolve, cut)
    with BuildSketch(Plane(origin=(-23.15, -14, 16), x_dir=(-0.7071067812, 0.7071067812, 0), z_dir=(0.7071067812, 0.7071067812, 0))):
        with BuildLine():
            ThreePointArc((0, -1), (1, 0), (0, 1))
            Line((0, 1), (0, -1))
        make_face()
    revolve(axis=Axis((-23.15, -14, 16), (0, 0, 1)), mode=Mode.SUBTRACT)


with BuildPart() as f1_2:
    add(f1_1.part)

    # F19_t11: cut F19_tool12
    add(f19_tool12.part, mode=Mode.SUBTRACT)


with BuildPart() as f19_tool18:
    # F19_s19 → F19_t20 (new body)
    with BuildSketch(Plane.XZ.offset(-14)):
        with Locations((-22.65, 16.5)):
            Rectangle(F19_S19_W, F19_S19_H)
    extrude(amount=-F19_T20_DEPTH)

    # F19_s21 → F19_t22 (revolve, cut)
    with BuildSketch(Plane(origin=(-23.15, 14, 16), x_dir=(-0.7071067812, 0, -0.7071067812), z_dir=(0.7071067812, 0, -0.7071067812))):
        with BuildLine():
            ThreePointArc((0, -1), (1, 0), (0, 1))
            Line((0, 1), (0, -1))
        make_face()
    revolve(axis=Axis((-23.15, 14, 16), (0, 1, 0)), mode=Mode.SUBTRACT)


with BuildPart() as f1_3:
    add(f1_2.part)

    # F19_t17: cut F19_tool18
    add(f19_tool18.part, mode=Mode.SUBTRACT)


with BuildPart() as f19_tool24:
    # F19_s25 → F19_t26 (new body)
    with BuildSketch(Plane.XZ.offset(-14)):
        with Locations((-46.65, 16.5)):
            Rectangle(F19_S25_W, F19_S25_H)
    extrude(amount=-F19_T26_DEPTH)

    # F19_s27 → F19_t28 (revolve, cut)
    with BuildSketch(Plane(origin=(-46.15, 14, 16), x_dir=(0.7071067812, 0, -0.7071067812), z_dir=(0.7071067812, 0, 0.7071067812))):
        with BuildLine():
            ThreePointArc((0, -1), (1, 0), (0, 1))
            Line((0, 1), (0, -1))
        make_face()
    revolve(axis=Axis((-46.15, 14, 16), (0, 1, 0)), mode=Mode.SUBTRACT)


with BuildPart() as f1_4:
    add(f1_3.part)

    # F19_t23: cut F19_tool24
    add(f19_tool24.part, mode=Mode.SUBTRACT)


solid = f1_4.part
